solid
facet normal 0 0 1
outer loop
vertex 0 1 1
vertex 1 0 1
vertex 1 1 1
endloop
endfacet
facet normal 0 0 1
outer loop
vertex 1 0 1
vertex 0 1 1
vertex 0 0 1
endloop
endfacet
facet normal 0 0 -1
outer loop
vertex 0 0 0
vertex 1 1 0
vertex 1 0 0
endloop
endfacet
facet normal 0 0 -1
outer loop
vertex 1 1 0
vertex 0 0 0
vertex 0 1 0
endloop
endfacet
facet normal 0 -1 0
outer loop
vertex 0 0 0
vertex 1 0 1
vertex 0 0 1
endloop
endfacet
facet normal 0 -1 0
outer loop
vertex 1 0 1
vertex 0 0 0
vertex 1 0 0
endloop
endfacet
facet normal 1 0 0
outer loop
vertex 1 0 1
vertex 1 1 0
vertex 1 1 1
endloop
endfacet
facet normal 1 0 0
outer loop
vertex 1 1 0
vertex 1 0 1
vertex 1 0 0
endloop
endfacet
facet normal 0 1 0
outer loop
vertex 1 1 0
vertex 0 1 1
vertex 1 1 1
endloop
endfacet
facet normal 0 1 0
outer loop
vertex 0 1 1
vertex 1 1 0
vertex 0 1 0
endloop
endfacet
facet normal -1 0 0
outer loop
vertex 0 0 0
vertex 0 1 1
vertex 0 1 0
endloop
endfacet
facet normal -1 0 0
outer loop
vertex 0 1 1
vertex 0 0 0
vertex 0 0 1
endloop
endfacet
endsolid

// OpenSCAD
number=1;
echo(number);// Print the number
string="some text";
echo(string);// Print the text
cube([number,number,number]);
